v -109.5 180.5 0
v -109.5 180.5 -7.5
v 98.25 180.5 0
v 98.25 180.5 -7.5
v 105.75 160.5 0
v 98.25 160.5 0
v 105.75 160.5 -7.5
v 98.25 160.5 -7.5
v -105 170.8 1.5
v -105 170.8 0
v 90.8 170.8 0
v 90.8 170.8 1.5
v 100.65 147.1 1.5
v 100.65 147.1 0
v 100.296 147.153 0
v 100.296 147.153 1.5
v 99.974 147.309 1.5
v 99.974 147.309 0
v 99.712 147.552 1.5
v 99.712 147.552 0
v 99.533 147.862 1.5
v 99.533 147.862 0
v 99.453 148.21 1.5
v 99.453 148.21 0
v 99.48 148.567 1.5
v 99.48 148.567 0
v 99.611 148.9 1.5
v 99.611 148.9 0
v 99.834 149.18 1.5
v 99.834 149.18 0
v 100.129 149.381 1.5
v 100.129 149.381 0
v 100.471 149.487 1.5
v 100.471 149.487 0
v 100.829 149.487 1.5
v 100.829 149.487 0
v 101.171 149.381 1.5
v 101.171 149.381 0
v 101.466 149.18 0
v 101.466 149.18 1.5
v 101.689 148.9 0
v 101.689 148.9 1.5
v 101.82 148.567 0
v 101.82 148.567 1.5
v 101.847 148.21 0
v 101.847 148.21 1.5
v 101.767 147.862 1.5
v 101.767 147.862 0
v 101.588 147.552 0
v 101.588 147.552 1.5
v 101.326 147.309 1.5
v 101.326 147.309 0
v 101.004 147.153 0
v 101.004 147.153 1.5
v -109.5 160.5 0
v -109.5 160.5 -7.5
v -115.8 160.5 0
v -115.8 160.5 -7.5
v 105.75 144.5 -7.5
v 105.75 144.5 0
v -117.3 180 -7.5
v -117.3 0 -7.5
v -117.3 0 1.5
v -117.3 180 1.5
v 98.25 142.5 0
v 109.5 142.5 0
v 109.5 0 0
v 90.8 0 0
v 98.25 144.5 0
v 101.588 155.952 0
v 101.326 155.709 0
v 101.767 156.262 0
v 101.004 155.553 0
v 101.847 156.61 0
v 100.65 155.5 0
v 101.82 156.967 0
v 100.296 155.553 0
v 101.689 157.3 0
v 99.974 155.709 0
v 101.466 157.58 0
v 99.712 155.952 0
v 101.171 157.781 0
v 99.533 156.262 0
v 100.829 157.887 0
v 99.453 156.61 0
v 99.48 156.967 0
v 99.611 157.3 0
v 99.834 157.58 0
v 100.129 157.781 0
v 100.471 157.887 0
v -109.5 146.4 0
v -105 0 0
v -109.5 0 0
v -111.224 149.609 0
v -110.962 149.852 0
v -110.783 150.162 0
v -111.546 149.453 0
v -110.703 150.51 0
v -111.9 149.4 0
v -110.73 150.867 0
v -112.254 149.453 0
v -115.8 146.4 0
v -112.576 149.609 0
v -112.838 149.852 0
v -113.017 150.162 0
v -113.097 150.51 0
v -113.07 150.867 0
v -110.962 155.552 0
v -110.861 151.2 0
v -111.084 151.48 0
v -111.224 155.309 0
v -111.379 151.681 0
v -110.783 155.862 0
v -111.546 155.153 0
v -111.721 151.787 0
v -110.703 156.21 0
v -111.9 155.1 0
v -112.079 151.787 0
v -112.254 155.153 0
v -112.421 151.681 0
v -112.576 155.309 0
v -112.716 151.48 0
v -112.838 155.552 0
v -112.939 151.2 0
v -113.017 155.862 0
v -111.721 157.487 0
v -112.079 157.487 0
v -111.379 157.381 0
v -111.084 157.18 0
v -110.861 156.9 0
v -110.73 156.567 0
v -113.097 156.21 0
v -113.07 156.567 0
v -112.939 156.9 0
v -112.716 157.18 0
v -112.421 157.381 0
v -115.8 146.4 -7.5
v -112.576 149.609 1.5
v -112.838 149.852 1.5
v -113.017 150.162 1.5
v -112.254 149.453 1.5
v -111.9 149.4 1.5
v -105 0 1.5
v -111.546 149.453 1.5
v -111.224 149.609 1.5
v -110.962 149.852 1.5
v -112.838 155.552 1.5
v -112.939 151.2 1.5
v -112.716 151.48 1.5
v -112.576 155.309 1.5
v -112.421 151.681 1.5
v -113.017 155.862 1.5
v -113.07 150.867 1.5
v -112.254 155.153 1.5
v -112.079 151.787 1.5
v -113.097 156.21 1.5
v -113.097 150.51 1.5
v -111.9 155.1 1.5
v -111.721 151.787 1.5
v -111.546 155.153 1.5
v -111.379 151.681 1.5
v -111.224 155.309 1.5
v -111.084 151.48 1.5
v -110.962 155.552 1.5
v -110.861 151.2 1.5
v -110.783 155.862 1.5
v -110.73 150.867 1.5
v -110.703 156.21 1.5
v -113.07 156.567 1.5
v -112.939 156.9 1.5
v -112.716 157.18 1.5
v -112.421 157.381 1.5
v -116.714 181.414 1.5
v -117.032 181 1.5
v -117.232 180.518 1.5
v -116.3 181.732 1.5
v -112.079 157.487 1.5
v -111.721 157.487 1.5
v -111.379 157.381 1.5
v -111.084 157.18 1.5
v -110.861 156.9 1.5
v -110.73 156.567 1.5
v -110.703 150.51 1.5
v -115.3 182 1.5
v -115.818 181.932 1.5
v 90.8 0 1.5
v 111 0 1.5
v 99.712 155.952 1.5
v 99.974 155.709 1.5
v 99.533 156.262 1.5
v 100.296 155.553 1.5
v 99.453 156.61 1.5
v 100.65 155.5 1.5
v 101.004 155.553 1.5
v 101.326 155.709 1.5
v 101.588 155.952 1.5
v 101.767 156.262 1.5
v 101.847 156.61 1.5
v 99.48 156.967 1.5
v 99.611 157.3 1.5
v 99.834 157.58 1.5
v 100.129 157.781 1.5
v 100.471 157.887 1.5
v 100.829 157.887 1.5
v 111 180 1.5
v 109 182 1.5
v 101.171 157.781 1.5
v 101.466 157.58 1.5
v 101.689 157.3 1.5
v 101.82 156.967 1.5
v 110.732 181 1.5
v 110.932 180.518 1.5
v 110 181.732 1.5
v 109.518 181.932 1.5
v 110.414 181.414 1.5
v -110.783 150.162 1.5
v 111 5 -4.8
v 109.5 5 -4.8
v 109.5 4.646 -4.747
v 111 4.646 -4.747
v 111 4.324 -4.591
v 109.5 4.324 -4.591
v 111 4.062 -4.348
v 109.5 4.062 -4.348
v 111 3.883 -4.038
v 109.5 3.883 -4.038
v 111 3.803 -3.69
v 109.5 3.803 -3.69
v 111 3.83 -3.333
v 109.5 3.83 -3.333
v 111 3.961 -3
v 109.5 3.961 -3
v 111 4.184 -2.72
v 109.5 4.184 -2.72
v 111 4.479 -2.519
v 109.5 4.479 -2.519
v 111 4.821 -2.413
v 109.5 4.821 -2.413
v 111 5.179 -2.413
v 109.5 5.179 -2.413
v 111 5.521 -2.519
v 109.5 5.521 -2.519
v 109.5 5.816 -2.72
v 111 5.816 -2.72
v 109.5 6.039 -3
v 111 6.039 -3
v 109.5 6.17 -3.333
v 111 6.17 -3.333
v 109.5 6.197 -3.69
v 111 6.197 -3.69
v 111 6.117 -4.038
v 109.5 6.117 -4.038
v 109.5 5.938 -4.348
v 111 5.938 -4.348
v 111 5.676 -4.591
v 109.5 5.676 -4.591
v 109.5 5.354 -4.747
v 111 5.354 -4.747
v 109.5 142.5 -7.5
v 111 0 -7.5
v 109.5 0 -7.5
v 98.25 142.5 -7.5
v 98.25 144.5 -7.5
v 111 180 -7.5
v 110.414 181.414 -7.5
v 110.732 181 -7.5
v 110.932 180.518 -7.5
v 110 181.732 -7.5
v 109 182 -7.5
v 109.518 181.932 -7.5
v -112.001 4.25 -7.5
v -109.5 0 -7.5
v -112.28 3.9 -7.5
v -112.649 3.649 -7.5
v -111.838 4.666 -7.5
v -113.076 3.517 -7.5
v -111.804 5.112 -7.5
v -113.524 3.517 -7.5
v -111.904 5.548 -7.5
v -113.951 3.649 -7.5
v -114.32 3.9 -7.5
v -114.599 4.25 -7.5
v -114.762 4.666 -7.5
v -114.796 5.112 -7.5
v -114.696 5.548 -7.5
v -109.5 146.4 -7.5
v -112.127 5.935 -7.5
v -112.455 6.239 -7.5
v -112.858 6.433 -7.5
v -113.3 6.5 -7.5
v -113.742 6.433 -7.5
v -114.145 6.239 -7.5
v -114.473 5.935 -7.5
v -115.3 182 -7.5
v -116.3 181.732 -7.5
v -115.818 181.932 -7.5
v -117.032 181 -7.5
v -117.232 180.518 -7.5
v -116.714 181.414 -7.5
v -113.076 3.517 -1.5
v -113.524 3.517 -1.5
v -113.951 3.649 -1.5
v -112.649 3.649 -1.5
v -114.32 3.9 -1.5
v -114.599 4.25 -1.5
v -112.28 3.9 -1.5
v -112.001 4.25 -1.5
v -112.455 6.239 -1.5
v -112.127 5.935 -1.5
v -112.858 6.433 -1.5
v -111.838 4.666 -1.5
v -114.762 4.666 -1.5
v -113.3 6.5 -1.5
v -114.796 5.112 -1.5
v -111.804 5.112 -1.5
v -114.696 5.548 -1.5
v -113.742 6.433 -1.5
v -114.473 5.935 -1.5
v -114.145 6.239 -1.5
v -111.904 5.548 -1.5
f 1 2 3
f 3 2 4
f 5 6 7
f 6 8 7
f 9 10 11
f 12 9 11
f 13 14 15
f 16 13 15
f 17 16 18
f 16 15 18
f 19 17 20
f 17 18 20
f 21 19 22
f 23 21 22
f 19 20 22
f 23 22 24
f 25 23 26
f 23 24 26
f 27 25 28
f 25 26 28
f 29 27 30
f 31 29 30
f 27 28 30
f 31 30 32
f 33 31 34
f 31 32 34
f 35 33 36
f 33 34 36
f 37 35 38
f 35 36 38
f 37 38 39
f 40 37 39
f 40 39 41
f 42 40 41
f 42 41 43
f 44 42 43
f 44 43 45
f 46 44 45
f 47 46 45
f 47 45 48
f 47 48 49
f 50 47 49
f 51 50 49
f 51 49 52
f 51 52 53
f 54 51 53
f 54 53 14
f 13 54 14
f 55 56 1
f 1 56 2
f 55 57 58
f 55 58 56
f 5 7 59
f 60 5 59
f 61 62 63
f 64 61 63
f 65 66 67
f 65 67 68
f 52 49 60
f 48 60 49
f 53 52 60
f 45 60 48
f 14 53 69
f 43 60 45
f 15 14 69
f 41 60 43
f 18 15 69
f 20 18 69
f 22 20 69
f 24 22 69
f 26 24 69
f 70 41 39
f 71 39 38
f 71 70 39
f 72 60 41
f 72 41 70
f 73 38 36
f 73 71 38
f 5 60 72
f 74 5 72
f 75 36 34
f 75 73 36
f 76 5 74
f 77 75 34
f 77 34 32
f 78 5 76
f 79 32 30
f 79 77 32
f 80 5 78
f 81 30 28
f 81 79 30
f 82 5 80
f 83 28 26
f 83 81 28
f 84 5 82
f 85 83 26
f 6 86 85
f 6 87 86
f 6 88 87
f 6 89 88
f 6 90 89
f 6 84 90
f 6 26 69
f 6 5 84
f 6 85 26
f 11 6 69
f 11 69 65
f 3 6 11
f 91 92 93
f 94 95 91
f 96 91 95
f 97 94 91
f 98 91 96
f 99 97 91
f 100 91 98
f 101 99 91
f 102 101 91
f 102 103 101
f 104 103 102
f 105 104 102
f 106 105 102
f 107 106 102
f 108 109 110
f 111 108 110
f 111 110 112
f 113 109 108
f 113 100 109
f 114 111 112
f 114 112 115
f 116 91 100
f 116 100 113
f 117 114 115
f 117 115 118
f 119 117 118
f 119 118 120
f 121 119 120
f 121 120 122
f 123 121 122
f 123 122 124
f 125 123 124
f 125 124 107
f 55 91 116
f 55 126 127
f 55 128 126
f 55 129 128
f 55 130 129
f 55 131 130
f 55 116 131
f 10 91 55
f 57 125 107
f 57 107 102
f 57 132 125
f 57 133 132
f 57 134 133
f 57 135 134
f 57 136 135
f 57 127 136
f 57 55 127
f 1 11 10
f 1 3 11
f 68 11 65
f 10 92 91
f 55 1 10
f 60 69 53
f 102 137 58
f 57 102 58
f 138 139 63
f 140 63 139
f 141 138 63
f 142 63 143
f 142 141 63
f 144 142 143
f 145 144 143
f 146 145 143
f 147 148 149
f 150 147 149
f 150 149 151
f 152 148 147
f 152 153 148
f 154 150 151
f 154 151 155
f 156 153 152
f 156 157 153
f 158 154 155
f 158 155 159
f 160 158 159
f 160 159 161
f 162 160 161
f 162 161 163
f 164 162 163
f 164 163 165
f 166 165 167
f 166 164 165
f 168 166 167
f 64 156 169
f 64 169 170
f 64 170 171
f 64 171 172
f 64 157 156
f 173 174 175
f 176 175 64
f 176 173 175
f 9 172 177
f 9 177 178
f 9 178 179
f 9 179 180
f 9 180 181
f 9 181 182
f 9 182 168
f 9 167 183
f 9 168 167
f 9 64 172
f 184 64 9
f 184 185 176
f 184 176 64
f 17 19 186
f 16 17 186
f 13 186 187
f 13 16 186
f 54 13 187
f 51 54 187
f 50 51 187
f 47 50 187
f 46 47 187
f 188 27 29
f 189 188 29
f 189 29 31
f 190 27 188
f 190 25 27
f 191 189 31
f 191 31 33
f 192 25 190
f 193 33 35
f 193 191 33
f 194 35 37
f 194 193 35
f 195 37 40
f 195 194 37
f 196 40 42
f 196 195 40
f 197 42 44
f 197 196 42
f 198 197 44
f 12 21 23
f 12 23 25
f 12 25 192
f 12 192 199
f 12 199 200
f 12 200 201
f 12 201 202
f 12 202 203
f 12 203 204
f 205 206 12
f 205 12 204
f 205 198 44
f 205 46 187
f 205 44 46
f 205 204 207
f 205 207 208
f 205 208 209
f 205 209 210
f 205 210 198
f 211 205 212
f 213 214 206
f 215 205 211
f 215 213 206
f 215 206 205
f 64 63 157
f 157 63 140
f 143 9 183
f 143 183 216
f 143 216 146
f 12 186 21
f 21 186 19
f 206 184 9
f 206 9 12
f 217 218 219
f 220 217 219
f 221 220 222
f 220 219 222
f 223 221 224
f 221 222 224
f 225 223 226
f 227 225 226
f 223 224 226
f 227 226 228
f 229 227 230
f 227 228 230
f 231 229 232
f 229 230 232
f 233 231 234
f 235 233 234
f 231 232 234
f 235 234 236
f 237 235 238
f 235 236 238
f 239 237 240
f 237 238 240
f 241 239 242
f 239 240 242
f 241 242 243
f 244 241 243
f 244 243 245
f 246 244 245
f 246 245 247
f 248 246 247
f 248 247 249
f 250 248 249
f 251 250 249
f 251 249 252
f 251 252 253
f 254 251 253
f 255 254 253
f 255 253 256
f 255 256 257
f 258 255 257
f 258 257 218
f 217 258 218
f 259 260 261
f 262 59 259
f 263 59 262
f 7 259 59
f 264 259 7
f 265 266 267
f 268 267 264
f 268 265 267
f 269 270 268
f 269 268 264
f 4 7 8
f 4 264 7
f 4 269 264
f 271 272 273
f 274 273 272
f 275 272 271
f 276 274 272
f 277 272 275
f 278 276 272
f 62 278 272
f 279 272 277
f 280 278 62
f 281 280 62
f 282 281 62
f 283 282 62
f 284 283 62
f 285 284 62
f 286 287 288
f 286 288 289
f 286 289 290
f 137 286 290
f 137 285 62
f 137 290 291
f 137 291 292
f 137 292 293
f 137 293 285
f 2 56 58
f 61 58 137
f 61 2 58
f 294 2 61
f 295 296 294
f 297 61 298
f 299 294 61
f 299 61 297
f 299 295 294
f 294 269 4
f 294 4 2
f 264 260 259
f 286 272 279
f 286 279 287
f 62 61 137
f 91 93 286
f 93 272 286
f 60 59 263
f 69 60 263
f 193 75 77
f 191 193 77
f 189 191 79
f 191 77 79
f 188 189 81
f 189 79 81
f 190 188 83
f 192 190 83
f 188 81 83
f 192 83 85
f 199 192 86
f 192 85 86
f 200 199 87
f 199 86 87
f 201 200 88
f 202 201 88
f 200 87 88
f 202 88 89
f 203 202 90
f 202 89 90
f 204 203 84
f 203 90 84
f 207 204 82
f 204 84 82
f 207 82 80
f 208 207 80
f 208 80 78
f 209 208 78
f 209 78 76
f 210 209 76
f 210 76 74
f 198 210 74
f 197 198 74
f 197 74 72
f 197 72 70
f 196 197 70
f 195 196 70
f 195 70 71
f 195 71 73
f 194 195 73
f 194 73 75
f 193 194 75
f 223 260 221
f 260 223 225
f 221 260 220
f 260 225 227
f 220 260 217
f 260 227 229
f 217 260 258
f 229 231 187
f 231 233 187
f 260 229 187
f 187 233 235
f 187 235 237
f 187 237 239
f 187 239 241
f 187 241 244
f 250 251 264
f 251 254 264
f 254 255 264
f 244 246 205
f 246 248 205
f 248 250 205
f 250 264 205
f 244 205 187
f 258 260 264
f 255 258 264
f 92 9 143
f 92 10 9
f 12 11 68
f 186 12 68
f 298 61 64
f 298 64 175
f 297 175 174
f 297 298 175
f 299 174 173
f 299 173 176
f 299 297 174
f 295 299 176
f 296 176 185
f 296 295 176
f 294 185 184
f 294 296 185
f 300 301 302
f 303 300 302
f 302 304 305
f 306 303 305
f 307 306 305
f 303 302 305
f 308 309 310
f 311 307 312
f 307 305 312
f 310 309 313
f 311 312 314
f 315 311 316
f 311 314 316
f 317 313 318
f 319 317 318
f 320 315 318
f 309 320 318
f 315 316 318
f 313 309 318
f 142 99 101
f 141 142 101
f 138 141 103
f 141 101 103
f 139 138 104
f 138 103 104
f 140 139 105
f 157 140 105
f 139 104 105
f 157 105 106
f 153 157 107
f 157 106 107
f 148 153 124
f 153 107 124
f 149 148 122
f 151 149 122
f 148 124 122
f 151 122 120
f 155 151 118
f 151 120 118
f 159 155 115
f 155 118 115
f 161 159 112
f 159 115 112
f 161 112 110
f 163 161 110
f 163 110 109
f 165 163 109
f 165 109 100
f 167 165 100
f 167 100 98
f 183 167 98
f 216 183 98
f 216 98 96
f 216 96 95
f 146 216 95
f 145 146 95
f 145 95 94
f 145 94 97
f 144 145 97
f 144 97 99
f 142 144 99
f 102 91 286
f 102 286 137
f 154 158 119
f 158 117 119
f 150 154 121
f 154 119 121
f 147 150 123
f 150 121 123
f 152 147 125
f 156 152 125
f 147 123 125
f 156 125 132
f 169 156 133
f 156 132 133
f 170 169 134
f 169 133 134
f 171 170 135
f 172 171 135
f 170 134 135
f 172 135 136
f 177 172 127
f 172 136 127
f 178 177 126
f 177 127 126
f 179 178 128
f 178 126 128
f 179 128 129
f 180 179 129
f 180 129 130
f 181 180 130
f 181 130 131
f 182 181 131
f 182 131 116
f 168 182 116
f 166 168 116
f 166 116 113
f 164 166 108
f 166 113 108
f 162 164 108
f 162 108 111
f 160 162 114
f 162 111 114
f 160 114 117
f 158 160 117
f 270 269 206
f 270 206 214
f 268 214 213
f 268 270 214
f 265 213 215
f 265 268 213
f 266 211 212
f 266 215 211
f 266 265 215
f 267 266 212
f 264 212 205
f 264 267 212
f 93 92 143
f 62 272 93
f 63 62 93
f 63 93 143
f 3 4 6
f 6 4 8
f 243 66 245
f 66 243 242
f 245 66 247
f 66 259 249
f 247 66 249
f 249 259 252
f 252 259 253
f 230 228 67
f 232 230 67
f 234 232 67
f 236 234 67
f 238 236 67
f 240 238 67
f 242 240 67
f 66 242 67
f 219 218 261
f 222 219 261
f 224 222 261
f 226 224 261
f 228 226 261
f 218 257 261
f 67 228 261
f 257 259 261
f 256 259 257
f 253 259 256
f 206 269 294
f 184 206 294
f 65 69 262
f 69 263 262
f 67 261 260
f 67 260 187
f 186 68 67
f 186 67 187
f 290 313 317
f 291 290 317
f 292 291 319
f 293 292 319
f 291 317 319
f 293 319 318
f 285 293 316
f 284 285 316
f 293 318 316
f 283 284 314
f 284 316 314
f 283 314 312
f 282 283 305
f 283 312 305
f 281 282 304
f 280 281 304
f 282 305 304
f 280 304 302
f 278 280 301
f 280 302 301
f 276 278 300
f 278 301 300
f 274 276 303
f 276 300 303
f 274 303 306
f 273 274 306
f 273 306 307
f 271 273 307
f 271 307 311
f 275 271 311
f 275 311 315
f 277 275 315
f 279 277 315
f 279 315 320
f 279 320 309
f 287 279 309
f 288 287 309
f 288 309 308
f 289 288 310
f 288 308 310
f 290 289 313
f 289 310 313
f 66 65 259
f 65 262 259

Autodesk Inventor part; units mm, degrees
ref_plane "YZ Plane" through (0, 0, 0) normal (1, 0, 0) x (0, 1, 0)
ref_plane "XZ Plane" through (0, 0, 0) normal (0, 1, 0) x (-1, 0, 0)
ref_plane "XY Plane" through (0, 0, 0) normal (0, 0, 1) x (1, 0, 0)
sketch "Boceto1" plane through (0, 0, 0) normal (0, 0, 1) x (1, 0, 0)
  circle A0 centre (100.65, -156.7) radius 1.65 projected
  circle A1 centre (100.65, -148.3) radius 1.65 projected
  circle A2 centre (100.65, 156.7) radius 1.65 projected
  circle A3 centre (100.65, 148.3) radius 1.65 projected
  line L0 (97.75, 145) -> (105.25, 145) projected
  line L1 (105.25, 145) -> (105.25, 160) projected
  line L2 (105.25, 160) -> (97.75, 160) projected
  line L3 (97.75, 160) -> (97.75, 180) projected
  line L4 (97.75, 180) -> (-109, 180) projected
  line L5 (-109, 160) -> (-115.3, 160) projected
  line L6 (-109, -160) -> (-109, -180) projected
  line L7 (-115.3, 146.9) -> (-109, 146.9) projected
  line L8 (-109, -146.9) -> (-115.3, -146.9) projected
  line L9 (-109, 180) -> (-109, 160) projected
  line L10 (-115.3, -160) -> (-109, -160) projected
  line L11 (-109, -180) -> (97.75, -180) projected
  line L12 (97.75, -180) -> (97.75, -160) projected
  line L13 (97.75, -160) -> (105.25, -160) projected
  line L14 (105.25, -160) -> (105.25, -145) projected
  line L15 (105.25, -145) -> (97.75, -145) projected
  line L16 (97.75, -145) -> (97.75, -142) projected
  line L17 (97.75, -142) -> (109, -142) projected
  line L18 (109, -142) -> (109, 142) projected
  line L19 (109, 142) -> (97.75, 142) projected
  line L20 (97.75, 142) -> (97.75, 145) projected
  line L21 (109, 180) -> (97.75, 180)
  line L22 (-109, -160) -> (-109, -180)
  line L23 (-109, -180) -> (-102.7, -180)
  line L24 (-109, -180) -> (109, -180)
  line L25 (109, -180) -> (109, 180)
  line L26 (109, 180) -> (-109, 180)
  line L27 (111, 142) -> (111, 180)
  line L28 (109, 182) -> (97.75, 182)
  line L29 (-109, -182) -> (-102.7, -182)
  line L30 (-111, -182) -> (111, -182)
  line L31 (111, -182) -> (111, 182)
  line L32 (111, 182) -> (-111, 182)
  circle A4 centre (-111.9, -156.3) radius 1.2 projected
  circle A5 centre (-111.9, -150.6) radius 1.2 projected
  circle A6 centre (-111.9, 156.3) radius 1.2 projected
  circle A7 centre (-111.9, 150.6) radius 1.2 projected
  line L33 (-115.3, 160) -> (-115.3, 146.9) projected
  line L34 (-109, 146.9) -> (-109, -146.9) projected
  line L35 (-115.3, -146.9) -> (-115.3, -160) projected
  line L36 (-109, 180) -> (-115.3, 180)
  line L37 (-109, -180) -> (-115.3, -180)
  line L38 (-115.3, 180) -> (109, 180)
  line L39 (109, 180) -> (109, -180)
  line L40 (109, -180) -> (-115.3, -180)
  line L41 (-115.3, -180) -> (-115.3, 180)
  line L42 (-117.3, 180) -> (-117.3, -182)
  line L43 (-117.3, -182) -> (109, -182)
  line L44 (-115.3, 182) -> (111, 182)
  line L45 (111, 182) -> (111, -180)
  line L46 (-117.3, 180) -> (-117.3, 182)
  line L47 (-117.3, 182) -> (-115.3, 182)
  point P0 (0, 0)
  dimension "d1" = 2
  dimension "d3" = 2
  dimension "d20" = 2
  dimension "d21" = 2
extrude "Extrusión1" add sketch "Boceto1" against normal blind 7.5 contours L0 L1 L2 L3 L21 L25 L19 L20 | L25 L24 L12 L13 L14 L15 L16 L17 | L9 L5 L41 L36 | L37 L41 L10 L6 | L7 L34 L8 L41 | L31 L30 L29 L43 L42 L46 L47 L44 L32 L28 L27
sketch "Boceto2" plane through (0, 0, 0) normal (0, 0, 1) x (1, 0, 0)
  line L0 (-117.3, -182) -> (111, -182) projected
  line L1 (111, -182) -> (111, 182) projected
  line L2 (111, 182) -> (-117.3, 182) projected
  line L3 (90.8, 170.8) -> (90.8, -176) projected
  line L4 (90.8, 170.8) -> (90.8, -176) projected
  line L5 (-19.4789, -176) -> (90.8, -176) projected
  line L6 (90.8, -176) -> (-99.7, -176) projected
  line L7 (-99.7, -176) -> (-99.7, 170.8) projected
  line L8 (-99.7, 170.8) -> (90.8, 170.8) projected
  line L9 (-117.3, 182) -> (-117.3, -182) projected
  line L10 (-105.5008, -176) -> (-99.7, -176)
  line L11 (-99.7, 170.8) -> (-105.5008, 170.8)
  line L12 (-109, 160) -> (-109, 180) projected
  line L13 (-109, 170.8) -> (-105, 170.8)
  line L14 (-105, 170.8) -> (-105, -176)
  point P0 (0, 0)
  dimension "d33" = 4
extrude "Extrusión2" add sketch "Boceto2" along normal blind 1.5
sketch "Boceto3" plane through (-111, -182, -7.5) normal (0, -1, 0) x (1, 0, 0)
  line L0 (222, 0) -> (-6.3, 0) projected
  line L1 (222, 0) -> (222, 9) projected
  line L2 (-6.3, 9) -> (222, 9) projected
  line L3 (-6.3, 0) -> (-6.3, 9) projected
  point P0 (111, 7.5)
extrude "Extrusión3" add sketch "Boceto3" along normal blind 5.2
sketch "Boceto5" plane through (0, 0, 1.5) normal (0, 0, 1) x (1, 0, 0)
  circle A0 centre (100.65, -156.7) radius 1.65 projected
  circle A1 centre (100.65, -148.3) radius 1.65 projected
  circle A2 centre (100.65, 156.7) radius 1.65 projected
  circle A3 centre (100.65, 148.3) radius 1.65 projected
  line L0 (97.75, 145) -> (105.25, 145) projected
  line L1 (105.25, 145) -> (105.25, 160) projected
  line L2 (105.25, 160) -> (97.75, 160) projected
  line L3 (97.75, 160) -> (97.75, 180) projected
  line L4 (97.75, 180) -> (-109, 180) projected
  line L5 (-109, 160) -> (-115.3, 160) projected
  line L6 (-109, -160) -> (-109, -180) projected
  line L7 (-115.3, 146.9) -> (-109, 146.9) projected
  line L8 (-109, -146.9) -> (-115.3, -146.9) projected
  line L9 (-109, 180) -> (-109, 160) projected
  line L10 (-115.3, -160) -> (-109, -160) projected
  line L11 (-109, -180) -> (97.75, -180) projected
  line L12 (97.75, -180) -> (97.75, -160) projected
  line L13 (97.75, -160) -> (105.25, -160) projected
  line L14 (105.25, -160) -> (105.25, -145) projected
  line L15 (105.25, -145) -> (97.75, -145) projected
  line L16 (97.75, -145) -> (97.75, -142) projected
  line L17 (97.75, -142) -> (109, -142) projected
  line L18 (109, -142) -> (109, 142) projected
  line L19 (109, 142) -> (97.75, 142) projected
  line L20 (97.75, 142) -> (97.75, 145) projected
  circle A4 centre (-111.9, -156.3) radius 1.2 projected
  circle A5 centre (-111.9, -150.6) radius 1.2 projected
  circle A6 centre (-111.9, 156.3) radius 1.2 projected
  circle A7 centre (-111.9, 150.6) radius 1.2 projected
  line L21 (-115.3, 160) -> (-115.3, 146.9) projected
  line L22 (-109, 146.9) -> (-109, -146.9) projected
  line L23 (-115.3, -146.9) -> (-115.3, -160) projected
  point P0 (0, 0)
hole "Agujero1" at (100.65, 148.3, 1.5) at (100.65, 156.7, 1.5) at (100.65, -156.7, 1.5) at (100.65, -148.3, 1.5) at (-111.9, -156.3, 1.5) at (-111.9, -150.6, 1.5) at (-111.9, 150.6, 1.5) at (-111.9, 156.3, 1.5) direction (0, 0, -1) diameter 2.4 end through all
sketch "Boceto6" plane through (0, 0, -7.5) normal (0, 0, -1) x (-1, 0, 0)
  line L0 (117.3, 182) -> (-111, 182) projected
  line L1 (-111, 182) -> (-111, -187.2) projected
  line L2 (117.3, -187.2) -> (-111, -187.2) projected
  line L3 (117.3, 182) -> (117.3, -187.2) projected
  line L4 (-97.75, 160) -> (-97.75, 180) projected
  line L5 (-97.75, 180) -> (109, 180) projected
  line L6 (109, 180) -> (109, 160) projected
  line L7 (109, 160) -> (115.3, 160) projected
  line L8 (115.3, 160) -> (115.3, 146.9) projected
  line L9 (115.3, 146.9) -> (109, 146.9) projected
  line L10 (109, 146.9) -> (109, -146.9) projected
  line L11 (109, -146.9) -> (115.3, -146.9) projected
  line L12 (115.3, -146.9) -> (115.3, -160) projected
  line L13 (115.3, -160) -> (109, -160) projected
  line L14 (109, -160) -> (109, -180) projected
  line L15 (109, -180) -> (-97.75, -180) projected
  line L16 (-97.75, -180) -> (-97.75, -160) projected
  line L17 (-97.75, -160) -> (-105.25, -160) projected
  line L18 (-105.25, -160) -> (-105.25, -145) projected
  line L19 (-105.25, -145) -> (-97.75, -145) projected
  line L20 (-97.75, -145) -> (-97.75, -142) projected
  line L21 (-97.75, -142) -> (-109, -142) projected
  line L22 (-109, -142) -> (-109, 142) projected
  line L23 (-109, 142) -> (-97.75, 142) projected
  line L24 (-97.75, 142) -> (-97.75, 145) projected
  line L25 (-97.75, 145) -> (-105.25, 145) projected
  line L26 (-105.25, 145) -> (-105.25, 160) projected
  line L27 (-105.25, 160) -> (-97.75, 160) projected
  line L28 (117.3, 182) -> (117.3, -187.2) projected
  line L29 (117.3, 182) -> (-111, 182) projected
  line L30 (-111, 182) -> (-111, -187.2) projected
  line L31 (117.3, -187.2) -> (-111, -187.2) projected
  line L32 (109.5, 160.5) -> (109.5, 180.5)
  line L33 (109.5, 180.5) -> (-98.25, 180.5)
  line L34 (-98.25, 180.5) -> (-98.25, 160.5)
  line L35 (-98.25, 160.5) -> (-105.75, 160.5)
  line L36 (-105.75, 160.5) -> (-105.75, 144.5)
  line L37 (-105.75, 144.5) -> (-98.25, 144.5)
  line L38 (-98.25, 144.5) -> (-98.25, 142.5)
  line L39 (-98.25, 142.5) -> (-109.5, 142.5)
  line L40 (-109.5, 142.5) -> (-109.5, -142.5)
  line L41 (-109.5, -142.5) -> (-98.25, -142.5)
  line L42 (-98.25, -142.5) -> (-98.25, -144.5)
  line L43 (-98.25, -144.5) -> (-105.75, -144.5)
  line L44 (-105.75, -144.5) -> (-105.75, -160.5)
  line L45 (-105.75, -160.5) -> (-98.25, -160.5)
  line L46 (-98.25, -160.5) -> (-98.25, -180.5)
  line L47 (-98.25, -180.5) -> (109.5, -180.5)
  line L48 (109.5, -180.5) -> (109.5, -160.5)
  line L49 (109.5, -160.5) -> (115.8, -160.5)
  line L50 (115.8, -160.5) -> (115.8, -146.4)
  line L51 (115.8, -146.4) -> (109.5, -146.4)
  line L52 (109.5, -146.4) -> (109.5, 146.4)
  line L53 (109.5, 146.4) -> (115.8, 146.4)
  line L54 (115.8, 146.4) -> (115.8, 160.5)
  line L55 (115.8, 160.5) -> (109.5, 160.5)
  dimension "d22" = 0.5
extrude "Extrusión4" cut sketch "Boceto6" against normal blind 7.5 contours L55 L54 L53 L52 L51 L50 L49 L48 L47 L46 L45 L44 L43 L42 L41 L40 L39 L38 L37 L36 L35 L34 L33 L32
fillet "Empalme1" radius 2 5 edges at (-117.3, 182, 0.75) (-117.3, 182, -3.75) (111, 182, -3) (111, -187.2, -3) (-117.3, -187.2, -3)
sketch "Boceto7" plane through (0, 0, -7.5) normal (0, 0, -1) x (-1, 0, 0)
  arc A0 (117.3, 7) -> (114.3, 10) centre (114.3, 7) ccw projected
  line L0 (114.3, 10) -> (100.3, 10) projected
  arc A1 (100.3, 10) -> (97.3, 7) centre (100.3, 7) ccw projected
  line L1 (97.3, 7) -> (97.3, -7) projected
  arc A2 (97.3, -7) -> (100.3, -10) centre (100.3, -7) ccw projected
  line L2 (100.3, -10) -> (114.3, -10) projected
  arc A3 (114.3, -10) -> (117.3, -7) centre (114.3, -7) ccw projected
  line L3 (117.3, -7) -> (117.3, 7) projected
  circle A4 centre (103.3, -5) radius 1 projected
  circle A5 centre (113.3, 5) radius 1 projected
  circle A6 centre (103.3, 5) radius 1 projected
  circle A7 centre (113.3, -5) radius 1 projected
  circle A8 centre (113.3, 5) radius 1 projected
  point P0 (0, 0)
hole "Agujero2" at (-113.3, 5, -7.5) at (-113.3, -5, -7.5) direction (0, 0, 1) diameter 3 depth 6
split "Dividir4" plane through (0, 0, 0) removes the side toward (0, -1, 0)
sketch "Boceto8" plane through (111, 180, 1.5) normal (1, 0, 0) x (0, 0, -1)
  circle A0 centre (5.1, -175) radius 1.2 projected
  point P0 (1.5, -180)
hole "Agujero3" at (111, 5, -3.6) direction (-1, 0, 0) diameter 2.4 depth 8 tip angle 118
properties part number "MarcoDerecho"
